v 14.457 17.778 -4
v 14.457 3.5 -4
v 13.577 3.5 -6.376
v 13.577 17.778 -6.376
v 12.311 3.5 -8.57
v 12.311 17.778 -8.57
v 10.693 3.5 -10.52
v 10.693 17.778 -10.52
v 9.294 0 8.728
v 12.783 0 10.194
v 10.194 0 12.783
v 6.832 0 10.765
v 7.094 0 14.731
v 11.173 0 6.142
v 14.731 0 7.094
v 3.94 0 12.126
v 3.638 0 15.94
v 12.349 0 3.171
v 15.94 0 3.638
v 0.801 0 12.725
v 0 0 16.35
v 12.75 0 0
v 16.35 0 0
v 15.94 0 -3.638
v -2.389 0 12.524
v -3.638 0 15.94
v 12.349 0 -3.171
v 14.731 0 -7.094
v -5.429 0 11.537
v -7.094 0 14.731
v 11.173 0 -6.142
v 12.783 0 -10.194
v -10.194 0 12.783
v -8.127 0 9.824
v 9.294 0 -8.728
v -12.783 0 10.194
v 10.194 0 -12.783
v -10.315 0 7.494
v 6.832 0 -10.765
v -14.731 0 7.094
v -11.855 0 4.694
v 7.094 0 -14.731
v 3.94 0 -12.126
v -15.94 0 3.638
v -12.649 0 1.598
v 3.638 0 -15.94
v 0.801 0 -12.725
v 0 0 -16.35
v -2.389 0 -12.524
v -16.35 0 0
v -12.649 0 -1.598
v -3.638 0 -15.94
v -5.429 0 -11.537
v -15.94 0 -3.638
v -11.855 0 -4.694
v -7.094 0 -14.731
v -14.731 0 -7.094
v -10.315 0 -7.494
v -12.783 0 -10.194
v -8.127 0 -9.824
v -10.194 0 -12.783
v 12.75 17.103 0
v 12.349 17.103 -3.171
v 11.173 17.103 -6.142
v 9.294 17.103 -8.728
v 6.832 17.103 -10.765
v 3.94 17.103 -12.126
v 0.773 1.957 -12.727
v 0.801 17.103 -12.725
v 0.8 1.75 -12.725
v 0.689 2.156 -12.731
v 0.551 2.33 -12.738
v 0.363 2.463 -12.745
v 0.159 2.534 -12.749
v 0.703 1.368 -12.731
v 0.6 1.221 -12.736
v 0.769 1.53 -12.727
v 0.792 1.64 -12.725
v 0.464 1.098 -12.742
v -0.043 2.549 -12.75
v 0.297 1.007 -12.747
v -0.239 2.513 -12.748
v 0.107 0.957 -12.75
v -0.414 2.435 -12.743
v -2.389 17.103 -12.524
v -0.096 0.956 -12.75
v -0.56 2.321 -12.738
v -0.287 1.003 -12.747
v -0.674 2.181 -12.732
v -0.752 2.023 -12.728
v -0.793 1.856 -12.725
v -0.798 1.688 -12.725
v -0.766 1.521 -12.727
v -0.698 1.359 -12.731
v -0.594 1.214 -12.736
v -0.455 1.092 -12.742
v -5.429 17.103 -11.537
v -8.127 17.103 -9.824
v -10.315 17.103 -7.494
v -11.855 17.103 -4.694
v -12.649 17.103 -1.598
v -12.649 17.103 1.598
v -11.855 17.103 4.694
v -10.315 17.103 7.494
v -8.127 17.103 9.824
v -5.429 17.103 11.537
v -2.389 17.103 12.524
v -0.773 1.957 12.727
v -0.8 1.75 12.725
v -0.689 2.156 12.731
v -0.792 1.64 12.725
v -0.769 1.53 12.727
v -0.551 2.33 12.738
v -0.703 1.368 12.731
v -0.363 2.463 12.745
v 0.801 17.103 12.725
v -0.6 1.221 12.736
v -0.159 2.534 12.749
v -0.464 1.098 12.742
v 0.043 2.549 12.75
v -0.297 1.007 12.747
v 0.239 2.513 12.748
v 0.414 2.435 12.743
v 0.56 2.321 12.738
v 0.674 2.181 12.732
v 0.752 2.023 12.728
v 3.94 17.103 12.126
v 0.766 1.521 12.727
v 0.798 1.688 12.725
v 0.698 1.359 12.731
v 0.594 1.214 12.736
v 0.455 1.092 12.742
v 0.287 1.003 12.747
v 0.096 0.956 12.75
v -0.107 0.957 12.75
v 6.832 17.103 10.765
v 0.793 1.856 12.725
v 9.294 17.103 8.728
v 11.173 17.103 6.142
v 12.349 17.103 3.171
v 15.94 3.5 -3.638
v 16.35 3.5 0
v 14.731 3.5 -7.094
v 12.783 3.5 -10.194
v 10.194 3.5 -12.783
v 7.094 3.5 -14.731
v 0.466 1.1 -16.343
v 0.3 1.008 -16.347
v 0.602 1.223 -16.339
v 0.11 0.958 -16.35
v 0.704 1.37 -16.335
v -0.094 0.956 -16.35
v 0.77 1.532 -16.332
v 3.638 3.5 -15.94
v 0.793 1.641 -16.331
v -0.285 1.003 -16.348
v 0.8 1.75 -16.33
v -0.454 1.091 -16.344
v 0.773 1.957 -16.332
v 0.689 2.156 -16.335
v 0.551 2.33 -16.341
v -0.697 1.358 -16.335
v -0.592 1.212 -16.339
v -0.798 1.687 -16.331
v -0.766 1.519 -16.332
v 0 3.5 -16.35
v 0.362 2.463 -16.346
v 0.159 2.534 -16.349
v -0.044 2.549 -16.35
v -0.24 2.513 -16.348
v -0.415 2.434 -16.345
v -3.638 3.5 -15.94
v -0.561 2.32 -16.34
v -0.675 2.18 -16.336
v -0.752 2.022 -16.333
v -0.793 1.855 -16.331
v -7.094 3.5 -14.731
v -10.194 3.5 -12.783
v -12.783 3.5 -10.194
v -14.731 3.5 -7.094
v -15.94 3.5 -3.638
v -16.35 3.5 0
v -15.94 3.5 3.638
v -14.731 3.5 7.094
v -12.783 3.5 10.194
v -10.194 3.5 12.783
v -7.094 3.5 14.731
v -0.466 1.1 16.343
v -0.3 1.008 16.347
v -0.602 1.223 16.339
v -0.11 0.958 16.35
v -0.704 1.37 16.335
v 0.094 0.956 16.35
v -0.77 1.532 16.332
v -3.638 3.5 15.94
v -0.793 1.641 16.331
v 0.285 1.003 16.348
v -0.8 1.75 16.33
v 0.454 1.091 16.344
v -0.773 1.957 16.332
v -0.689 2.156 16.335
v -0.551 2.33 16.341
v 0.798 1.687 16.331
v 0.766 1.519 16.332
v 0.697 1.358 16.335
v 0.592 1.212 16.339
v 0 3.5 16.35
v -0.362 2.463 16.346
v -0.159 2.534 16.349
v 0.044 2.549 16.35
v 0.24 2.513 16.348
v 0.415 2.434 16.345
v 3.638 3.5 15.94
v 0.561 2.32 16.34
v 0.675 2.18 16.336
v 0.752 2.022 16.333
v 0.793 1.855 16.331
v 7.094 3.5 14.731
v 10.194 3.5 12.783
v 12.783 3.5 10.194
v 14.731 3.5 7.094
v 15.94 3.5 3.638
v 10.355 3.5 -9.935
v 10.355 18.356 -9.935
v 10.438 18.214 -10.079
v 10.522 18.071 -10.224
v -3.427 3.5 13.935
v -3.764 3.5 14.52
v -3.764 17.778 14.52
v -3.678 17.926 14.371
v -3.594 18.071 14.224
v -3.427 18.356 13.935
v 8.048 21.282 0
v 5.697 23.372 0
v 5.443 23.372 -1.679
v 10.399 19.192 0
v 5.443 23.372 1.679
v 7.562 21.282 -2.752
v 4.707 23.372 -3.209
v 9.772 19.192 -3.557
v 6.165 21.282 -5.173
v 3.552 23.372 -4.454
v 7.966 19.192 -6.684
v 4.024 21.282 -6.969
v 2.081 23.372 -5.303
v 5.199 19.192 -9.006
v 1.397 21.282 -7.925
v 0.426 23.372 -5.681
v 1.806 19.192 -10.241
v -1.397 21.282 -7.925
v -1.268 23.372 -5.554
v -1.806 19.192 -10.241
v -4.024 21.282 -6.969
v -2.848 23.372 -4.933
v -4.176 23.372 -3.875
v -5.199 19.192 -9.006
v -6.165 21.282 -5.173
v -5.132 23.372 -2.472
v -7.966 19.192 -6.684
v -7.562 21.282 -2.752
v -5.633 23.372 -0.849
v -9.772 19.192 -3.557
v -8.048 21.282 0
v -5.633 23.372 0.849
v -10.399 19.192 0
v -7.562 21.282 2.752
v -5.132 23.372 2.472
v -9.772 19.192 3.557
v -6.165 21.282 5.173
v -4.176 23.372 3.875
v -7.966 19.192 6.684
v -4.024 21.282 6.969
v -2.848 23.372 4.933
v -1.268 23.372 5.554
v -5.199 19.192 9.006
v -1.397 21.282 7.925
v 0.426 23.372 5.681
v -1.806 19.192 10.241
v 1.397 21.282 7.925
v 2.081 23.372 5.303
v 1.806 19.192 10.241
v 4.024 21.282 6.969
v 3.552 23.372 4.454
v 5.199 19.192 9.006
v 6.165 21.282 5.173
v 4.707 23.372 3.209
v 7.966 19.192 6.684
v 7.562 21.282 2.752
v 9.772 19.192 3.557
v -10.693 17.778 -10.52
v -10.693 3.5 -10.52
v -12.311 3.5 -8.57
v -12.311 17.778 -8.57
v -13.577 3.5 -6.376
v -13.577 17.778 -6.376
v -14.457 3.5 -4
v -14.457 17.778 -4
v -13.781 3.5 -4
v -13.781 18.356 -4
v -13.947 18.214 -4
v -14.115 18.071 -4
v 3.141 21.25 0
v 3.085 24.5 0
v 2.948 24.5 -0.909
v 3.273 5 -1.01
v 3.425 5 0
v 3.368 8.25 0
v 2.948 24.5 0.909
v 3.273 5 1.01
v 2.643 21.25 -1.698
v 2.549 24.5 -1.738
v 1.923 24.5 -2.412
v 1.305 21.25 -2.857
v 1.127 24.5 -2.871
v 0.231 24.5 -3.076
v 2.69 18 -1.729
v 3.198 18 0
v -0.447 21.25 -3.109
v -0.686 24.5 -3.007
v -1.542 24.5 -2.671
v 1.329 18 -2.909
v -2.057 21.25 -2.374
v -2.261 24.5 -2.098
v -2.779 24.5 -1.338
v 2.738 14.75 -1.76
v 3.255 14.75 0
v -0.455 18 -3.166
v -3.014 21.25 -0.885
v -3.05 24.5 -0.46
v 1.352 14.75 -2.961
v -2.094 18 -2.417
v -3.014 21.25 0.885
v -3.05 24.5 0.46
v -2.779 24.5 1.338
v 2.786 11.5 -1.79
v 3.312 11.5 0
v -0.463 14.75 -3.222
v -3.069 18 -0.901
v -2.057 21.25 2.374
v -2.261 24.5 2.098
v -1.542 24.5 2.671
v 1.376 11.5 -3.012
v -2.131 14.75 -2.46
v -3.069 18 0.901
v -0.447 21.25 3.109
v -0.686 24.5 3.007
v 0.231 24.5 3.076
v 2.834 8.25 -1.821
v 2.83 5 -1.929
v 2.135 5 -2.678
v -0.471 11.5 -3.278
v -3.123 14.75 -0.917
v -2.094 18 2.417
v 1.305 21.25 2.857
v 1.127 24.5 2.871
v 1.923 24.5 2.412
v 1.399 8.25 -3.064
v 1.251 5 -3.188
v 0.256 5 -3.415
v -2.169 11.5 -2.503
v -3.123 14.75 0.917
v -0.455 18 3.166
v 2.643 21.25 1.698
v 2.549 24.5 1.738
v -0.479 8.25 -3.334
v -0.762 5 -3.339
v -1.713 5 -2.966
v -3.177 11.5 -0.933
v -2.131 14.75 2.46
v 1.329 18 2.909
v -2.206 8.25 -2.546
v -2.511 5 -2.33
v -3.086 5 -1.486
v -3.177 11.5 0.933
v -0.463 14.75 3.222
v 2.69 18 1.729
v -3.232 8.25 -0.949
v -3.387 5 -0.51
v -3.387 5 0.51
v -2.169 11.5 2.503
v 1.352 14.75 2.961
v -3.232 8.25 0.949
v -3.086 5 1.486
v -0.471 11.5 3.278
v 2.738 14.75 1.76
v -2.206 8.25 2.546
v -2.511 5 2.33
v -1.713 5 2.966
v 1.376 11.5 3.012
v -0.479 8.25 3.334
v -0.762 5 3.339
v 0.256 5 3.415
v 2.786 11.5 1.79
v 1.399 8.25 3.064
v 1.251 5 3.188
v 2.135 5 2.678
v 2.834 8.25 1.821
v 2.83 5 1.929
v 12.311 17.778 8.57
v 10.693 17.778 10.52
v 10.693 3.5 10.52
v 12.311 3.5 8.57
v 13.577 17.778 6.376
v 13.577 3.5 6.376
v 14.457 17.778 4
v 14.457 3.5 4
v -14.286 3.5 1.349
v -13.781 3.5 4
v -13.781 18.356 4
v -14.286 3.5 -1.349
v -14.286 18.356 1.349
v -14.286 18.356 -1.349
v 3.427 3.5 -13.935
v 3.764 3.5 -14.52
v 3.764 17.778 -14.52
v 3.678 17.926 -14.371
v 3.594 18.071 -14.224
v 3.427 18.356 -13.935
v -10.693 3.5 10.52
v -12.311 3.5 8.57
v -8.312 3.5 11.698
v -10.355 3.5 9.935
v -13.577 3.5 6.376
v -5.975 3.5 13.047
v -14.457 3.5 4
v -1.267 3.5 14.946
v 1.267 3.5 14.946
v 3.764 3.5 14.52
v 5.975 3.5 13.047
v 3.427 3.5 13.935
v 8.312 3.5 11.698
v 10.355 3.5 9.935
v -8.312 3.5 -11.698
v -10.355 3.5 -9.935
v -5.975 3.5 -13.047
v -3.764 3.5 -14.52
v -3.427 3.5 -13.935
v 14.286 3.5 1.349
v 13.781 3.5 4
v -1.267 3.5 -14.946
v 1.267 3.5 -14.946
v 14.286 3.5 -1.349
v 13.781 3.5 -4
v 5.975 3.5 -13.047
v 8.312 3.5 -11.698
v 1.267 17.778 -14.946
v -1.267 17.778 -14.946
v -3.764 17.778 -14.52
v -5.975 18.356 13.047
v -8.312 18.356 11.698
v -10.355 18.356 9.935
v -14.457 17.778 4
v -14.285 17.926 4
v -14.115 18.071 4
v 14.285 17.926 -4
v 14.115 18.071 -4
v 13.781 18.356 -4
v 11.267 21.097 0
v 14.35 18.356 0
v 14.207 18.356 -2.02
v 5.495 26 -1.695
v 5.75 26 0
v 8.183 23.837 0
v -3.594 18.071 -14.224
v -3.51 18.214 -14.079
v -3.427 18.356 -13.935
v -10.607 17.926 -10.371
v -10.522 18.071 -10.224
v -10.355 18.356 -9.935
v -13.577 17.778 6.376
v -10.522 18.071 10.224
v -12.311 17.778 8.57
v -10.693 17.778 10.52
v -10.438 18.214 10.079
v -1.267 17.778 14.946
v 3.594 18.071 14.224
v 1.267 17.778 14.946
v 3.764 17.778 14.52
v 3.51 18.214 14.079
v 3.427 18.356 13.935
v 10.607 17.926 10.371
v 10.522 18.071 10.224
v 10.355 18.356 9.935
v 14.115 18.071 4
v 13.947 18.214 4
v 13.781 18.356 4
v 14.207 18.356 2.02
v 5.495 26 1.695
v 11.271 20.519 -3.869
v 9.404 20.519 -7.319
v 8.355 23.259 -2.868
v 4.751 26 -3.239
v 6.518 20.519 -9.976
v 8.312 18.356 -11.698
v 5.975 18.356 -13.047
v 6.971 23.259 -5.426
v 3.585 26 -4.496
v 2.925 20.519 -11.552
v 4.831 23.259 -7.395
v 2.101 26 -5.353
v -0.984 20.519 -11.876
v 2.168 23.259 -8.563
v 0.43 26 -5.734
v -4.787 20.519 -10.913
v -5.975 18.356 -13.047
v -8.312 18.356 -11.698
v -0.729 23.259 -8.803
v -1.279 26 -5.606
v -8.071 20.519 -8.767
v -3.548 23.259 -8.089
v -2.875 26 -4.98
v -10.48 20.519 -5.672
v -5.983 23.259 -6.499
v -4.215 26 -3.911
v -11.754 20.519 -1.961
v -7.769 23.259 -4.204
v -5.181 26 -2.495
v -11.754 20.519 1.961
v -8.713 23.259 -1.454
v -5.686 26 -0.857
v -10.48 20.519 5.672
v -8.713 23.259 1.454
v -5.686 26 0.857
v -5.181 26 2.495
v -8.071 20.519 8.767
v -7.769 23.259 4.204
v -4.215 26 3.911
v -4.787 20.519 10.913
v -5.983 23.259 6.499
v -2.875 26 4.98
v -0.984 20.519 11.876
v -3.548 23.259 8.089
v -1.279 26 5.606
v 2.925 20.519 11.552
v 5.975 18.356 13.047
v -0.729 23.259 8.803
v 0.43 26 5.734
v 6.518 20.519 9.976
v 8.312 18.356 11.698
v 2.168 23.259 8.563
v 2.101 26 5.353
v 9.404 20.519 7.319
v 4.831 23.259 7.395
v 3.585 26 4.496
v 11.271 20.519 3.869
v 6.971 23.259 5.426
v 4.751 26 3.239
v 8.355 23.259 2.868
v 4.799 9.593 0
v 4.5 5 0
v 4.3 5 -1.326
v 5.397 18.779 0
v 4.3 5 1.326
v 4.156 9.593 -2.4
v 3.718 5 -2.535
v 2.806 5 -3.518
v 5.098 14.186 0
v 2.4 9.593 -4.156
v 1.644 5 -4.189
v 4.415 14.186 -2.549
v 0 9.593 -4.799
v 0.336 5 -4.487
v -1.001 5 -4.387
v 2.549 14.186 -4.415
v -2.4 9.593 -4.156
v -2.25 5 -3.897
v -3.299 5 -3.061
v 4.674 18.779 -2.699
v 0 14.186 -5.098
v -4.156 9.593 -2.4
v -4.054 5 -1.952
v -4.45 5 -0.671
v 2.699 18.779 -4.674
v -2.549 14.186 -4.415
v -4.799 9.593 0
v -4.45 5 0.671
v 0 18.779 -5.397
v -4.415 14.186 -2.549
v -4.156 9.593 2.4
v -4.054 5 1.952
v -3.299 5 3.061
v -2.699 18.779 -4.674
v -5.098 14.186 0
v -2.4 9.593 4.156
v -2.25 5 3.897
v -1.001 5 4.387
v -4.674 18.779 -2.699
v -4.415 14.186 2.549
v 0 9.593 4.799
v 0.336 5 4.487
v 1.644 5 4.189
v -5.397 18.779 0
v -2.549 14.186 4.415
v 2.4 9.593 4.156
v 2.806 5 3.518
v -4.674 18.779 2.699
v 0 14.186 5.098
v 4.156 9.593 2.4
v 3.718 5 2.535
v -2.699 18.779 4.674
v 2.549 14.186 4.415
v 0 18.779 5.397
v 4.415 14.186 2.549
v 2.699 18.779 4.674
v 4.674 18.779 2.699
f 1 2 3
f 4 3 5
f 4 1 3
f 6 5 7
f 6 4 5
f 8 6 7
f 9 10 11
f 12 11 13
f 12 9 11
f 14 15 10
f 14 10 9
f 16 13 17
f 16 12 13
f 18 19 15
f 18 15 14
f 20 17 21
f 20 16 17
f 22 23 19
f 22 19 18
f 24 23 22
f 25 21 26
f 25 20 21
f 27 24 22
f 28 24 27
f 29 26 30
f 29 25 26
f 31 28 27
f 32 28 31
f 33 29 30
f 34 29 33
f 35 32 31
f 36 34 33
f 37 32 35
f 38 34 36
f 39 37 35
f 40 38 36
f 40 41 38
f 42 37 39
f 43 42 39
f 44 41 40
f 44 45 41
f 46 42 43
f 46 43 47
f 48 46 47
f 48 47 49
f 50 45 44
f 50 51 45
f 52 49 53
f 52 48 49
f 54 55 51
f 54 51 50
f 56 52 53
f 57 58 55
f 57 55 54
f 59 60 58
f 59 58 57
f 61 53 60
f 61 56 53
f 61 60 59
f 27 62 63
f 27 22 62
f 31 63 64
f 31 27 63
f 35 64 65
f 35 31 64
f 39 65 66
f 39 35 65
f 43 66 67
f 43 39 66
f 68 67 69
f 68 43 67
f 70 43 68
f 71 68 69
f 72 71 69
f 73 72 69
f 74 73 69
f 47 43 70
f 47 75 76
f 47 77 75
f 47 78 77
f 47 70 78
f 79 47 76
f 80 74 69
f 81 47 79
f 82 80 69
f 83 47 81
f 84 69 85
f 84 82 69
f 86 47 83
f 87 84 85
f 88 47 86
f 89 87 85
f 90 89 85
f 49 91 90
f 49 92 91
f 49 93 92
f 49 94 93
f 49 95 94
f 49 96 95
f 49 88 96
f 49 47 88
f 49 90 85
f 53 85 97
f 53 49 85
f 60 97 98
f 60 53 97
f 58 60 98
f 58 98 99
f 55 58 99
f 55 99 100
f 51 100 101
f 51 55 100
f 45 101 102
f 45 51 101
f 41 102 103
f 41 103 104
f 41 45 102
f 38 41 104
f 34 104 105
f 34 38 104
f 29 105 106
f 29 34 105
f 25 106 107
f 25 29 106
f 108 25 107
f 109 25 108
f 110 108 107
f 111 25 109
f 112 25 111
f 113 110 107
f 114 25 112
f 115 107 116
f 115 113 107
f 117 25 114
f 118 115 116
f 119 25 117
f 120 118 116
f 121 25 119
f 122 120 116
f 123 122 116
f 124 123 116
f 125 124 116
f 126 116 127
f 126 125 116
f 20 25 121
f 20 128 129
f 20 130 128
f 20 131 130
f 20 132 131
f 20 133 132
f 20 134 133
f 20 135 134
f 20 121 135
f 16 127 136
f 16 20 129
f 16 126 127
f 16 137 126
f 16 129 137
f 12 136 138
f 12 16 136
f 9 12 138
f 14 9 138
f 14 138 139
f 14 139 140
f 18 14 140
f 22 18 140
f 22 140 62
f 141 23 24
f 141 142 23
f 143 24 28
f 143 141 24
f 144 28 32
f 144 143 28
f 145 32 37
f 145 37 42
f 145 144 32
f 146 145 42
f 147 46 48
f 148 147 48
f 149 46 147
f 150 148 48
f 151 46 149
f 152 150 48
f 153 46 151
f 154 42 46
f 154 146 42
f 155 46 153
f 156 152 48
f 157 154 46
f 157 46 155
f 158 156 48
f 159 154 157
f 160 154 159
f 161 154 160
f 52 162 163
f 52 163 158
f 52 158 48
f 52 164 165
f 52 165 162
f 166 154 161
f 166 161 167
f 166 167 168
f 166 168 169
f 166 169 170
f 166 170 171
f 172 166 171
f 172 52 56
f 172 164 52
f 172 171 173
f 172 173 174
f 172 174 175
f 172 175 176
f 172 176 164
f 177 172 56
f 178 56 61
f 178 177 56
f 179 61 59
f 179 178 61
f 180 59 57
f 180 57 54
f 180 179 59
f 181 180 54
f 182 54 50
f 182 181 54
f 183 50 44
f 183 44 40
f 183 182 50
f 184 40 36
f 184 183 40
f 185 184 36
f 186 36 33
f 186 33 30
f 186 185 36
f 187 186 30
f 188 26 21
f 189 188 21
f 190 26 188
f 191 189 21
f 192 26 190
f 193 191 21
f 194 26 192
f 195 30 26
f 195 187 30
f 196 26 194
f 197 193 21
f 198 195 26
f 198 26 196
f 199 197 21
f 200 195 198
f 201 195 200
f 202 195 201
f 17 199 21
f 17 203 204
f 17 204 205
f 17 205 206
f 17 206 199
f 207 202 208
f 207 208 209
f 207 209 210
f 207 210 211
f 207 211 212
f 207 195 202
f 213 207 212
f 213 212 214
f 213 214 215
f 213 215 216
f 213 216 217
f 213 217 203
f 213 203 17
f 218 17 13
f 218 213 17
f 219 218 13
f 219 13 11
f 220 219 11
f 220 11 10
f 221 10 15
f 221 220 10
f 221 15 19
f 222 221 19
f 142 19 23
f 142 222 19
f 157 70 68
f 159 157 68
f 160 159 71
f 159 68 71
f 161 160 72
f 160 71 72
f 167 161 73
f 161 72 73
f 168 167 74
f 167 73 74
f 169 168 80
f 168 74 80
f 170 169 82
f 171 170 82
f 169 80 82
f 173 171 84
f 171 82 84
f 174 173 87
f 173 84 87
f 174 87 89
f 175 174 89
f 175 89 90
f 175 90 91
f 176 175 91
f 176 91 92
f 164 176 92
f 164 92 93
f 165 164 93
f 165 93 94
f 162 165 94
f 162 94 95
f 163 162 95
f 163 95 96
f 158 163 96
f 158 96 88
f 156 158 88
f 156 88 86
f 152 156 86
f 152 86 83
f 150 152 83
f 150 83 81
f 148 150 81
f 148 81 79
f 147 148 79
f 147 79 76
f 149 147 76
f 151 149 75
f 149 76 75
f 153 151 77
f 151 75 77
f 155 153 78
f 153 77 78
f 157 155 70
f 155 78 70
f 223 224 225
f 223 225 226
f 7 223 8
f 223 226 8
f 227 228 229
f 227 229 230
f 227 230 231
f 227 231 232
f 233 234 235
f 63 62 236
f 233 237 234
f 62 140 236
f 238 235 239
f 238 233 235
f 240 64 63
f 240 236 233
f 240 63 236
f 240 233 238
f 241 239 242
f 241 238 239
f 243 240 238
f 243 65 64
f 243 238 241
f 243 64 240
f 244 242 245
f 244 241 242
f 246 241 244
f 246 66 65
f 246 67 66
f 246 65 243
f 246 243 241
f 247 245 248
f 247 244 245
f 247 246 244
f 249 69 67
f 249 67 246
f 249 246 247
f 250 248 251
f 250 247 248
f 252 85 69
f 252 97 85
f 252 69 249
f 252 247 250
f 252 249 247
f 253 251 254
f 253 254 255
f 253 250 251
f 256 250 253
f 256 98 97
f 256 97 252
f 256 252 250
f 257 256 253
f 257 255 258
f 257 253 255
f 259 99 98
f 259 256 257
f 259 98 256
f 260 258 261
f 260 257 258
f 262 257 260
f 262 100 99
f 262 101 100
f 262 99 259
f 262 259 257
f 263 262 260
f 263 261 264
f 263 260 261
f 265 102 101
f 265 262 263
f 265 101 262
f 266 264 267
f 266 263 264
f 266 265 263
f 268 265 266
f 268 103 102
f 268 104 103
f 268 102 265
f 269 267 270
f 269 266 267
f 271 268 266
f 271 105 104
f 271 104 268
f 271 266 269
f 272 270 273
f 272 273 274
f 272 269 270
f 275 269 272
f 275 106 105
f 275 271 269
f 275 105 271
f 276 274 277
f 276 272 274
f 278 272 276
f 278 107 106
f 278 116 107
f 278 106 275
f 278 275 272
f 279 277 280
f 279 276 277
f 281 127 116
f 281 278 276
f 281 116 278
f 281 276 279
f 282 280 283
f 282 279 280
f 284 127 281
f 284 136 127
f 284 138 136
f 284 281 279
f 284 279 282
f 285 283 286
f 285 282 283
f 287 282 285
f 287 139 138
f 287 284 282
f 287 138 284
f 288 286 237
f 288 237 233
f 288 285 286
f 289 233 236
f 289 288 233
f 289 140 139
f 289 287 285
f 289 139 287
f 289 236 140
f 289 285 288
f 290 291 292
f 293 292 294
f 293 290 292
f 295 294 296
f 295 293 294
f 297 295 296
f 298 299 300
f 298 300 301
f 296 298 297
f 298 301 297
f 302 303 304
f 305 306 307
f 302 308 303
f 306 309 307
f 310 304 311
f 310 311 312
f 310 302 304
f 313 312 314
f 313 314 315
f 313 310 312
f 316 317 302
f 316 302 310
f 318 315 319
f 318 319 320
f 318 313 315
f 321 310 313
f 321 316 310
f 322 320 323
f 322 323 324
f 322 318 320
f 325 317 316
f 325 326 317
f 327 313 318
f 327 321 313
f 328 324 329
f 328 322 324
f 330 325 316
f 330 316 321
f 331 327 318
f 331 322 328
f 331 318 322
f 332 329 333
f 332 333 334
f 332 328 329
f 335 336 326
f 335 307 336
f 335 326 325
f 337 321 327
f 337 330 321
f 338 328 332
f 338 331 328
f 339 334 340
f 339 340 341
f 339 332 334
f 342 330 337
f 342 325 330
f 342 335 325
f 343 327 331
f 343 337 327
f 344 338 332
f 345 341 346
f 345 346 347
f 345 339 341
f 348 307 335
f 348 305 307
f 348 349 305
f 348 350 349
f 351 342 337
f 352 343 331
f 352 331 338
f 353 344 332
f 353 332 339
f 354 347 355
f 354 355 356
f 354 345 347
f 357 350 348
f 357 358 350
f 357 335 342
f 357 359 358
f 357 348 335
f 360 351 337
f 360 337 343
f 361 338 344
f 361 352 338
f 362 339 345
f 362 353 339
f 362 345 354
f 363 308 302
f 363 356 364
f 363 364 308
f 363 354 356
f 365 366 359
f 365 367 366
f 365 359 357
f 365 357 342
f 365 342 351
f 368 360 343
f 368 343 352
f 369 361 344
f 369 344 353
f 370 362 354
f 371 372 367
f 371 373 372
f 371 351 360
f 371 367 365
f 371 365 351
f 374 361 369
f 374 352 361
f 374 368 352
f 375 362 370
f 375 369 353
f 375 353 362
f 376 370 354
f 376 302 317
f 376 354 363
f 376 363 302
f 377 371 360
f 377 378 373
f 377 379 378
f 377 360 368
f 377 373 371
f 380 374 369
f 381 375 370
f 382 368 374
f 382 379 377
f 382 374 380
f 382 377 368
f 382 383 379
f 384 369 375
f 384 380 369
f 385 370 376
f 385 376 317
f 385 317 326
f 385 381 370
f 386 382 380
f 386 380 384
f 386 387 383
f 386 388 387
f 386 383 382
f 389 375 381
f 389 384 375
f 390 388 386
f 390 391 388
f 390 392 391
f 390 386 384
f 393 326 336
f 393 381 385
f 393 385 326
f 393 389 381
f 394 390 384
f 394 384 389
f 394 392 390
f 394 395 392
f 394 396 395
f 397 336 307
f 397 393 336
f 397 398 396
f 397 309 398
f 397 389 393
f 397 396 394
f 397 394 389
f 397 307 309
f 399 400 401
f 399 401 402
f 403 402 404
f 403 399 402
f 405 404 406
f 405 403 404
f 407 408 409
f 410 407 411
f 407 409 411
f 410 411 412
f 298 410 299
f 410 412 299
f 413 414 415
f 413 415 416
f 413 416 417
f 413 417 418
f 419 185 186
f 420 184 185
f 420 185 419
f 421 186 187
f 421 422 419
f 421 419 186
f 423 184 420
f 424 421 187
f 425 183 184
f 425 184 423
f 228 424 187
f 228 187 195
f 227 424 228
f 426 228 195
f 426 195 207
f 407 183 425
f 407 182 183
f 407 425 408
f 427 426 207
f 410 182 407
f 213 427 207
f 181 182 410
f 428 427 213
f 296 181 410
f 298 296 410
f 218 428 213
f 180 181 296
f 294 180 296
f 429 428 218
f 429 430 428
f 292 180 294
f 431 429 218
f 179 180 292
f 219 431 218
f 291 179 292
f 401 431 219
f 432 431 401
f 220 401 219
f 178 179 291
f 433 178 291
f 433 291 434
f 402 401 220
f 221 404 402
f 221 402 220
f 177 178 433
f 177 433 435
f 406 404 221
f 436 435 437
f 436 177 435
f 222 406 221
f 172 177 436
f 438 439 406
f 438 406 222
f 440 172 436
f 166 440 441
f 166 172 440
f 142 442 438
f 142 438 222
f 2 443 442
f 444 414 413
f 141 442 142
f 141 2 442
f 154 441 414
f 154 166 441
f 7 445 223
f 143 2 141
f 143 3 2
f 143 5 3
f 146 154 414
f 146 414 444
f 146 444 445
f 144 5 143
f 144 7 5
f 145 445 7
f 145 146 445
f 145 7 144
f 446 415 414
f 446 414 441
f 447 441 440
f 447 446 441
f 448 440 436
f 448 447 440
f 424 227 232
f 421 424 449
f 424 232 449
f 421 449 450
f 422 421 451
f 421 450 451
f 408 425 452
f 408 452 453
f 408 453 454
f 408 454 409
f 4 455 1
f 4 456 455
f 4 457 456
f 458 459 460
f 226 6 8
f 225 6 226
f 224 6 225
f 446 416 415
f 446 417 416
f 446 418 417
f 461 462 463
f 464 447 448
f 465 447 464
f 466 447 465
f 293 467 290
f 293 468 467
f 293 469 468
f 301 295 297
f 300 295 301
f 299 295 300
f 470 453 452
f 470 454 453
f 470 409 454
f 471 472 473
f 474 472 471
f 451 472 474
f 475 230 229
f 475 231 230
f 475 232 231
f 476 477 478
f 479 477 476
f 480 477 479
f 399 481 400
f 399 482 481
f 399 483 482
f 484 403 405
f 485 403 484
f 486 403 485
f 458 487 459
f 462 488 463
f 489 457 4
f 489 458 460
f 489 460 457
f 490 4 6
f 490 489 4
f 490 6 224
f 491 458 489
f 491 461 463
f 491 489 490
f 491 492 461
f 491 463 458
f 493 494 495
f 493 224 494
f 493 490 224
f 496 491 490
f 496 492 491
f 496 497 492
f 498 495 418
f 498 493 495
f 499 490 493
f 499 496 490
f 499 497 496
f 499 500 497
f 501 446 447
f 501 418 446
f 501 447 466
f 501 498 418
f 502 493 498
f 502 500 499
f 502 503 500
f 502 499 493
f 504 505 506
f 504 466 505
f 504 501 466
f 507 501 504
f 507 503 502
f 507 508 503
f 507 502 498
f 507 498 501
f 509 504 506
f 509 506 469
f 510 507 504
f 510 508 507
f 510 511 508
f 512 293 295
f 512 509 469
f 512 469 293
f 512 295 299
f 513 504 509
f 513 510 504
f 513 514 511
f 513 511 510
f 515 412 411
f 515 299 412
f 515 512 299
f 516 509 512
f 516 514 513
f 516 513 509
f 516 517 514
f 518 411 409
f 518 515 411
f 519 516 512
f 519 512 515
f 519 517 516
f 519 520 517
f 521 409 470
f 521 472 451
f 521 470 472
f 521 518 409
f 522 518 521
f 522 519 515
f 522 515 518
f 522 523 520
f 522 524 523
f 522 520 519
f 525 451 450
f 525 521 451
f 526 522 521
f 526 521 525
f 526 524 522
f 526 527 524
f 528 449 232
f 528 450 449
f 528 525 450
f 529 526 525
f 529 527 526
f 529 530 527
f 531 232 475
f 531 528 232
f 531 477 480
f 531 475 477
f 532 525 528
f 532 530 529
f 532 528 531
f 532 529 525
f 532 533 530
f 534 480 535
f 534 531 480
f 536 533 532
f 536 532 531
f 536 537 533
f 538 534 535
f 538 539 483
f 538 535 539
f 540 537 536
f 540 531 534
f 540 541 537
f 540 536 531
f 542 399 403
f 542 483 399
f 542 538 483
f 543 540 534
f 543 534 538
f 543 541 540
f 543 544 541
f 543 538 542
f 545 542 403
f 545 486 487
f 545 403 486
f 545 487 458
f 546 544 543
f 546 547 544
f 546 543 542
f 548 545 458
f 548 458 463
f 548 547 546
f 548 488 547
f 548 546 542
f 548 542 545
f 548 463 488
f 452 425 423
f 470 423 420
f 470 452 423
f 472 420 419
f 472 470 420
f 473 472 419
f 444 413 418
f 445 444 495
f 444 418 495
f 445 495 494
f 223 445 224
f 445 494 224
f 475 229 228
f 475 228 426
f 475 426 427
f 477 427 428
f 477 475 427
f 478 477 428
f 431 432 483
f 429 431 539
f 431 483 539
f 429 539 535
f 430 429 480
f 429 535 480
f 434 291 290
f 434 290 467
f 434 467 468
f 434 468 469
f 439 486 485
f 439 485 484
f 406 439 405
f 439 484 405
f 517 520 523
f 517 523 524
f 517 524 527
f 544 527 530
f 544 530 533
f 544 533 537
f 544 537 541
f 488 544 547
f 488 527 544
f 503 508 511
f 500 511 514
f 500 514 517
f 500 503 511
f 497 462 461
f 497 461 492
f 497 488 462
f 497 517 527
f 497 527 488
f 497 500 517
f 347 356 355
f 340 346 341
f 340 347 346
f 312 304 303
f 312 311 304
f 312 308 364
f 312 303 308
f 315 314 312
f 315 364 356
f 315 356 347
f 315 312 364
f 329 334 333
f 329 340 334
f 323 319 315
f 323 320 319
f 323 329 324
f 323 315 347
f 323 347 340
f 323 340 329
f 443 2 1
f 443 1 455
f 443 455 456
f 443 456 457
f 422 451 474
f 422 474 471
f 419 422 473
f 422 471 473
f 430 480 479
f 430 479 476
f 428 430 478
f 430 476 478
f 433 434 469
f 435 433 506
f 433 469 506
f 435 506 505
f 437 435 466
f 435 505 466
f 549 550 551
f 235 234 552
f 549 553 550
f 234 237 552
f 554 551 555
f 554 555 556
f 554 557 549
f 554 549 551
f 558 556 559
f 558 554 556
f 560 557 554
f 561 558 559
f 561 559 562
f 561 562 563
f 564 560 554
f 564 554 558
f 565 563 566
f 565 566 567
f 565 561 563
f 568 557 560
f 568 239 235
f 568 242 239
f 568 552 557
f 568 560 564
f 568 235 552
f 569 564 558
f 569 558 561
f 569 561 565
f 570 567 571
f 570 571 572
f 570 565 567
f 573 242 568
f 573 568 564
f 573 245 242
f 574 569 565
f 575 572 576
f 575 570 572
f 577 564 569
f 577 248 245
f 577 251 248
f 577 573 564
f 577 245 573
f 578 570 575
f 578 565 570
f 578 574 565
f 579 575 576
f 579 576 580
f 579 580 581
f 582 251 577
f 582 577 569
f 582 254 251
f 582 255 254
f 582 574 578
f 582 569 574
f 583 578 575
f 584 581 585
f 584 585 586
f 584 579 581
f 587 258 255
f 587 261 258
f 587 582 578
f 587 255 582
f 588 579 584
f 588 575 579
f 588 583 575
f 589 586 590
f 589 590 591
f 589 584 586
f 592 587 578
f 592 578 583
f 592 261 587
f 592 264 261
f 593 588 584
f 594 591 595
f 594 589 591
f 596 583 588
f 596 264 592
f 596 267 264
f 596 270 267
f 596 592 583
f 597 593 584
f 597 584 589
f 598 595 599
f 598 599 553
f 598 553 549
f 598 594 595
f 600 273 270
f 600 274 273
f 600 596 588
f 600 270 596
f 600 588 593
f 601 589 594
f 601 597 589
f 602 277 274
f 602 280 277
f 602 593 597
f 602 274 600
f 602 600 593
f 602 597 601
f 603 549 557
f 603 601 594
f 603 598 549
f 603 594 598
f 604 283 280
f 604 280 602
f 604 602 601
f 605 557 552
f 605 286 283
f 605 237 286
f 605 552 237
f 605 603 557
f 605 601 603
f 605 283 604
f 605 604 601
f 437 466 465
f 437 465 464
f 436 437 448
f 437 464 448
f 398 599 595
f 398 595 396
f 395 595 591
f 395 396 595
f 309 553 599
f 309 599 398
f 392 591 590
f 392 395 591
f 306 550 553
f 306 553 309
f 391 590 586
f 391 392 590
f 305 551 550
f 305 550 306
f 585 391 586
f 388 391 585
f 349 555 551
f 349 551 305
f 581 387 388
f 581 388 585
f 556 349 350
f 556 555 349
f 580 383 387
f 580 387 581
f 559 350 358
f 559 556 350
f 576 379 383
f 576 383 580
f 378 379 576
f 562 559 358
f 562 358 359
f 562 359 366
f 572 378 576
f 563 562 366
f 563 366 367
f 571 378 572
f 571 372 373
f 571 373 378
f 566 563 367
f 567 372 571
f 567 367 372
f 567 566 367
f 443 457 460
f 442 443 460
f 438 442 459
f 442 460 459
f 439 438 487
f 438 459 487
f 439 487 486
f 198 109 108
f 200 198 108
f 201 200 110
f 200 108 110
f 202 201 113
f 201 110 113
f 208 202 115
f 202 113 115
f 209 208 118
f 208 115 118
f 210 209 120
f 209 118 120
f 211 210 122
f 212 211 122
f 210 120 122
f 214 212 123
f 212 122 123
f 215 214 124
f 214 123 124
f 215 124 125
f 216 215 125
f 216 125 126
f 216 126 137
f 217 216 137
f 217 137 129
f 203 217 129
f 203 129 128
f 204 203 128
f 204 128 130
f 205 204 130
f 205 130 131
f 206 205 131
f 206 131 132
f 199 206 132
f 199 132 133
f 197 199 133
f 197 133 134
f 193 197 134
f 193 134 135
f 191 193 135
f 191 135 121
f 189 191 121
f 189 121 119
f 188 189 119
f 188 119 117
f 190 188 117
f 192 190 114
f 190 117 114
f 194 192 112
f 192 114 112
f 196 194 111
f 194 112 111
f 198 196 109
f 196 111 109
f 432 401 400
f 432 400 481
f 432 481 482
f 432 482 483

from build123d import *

# Parameters (mm, degrees)
CUT_EXTRUDE1_DEPTH        = 22.5
CIRPATTERN1_COUNT         = 6
M2X0_4_TAPPED_HOLE1_D     = 1.6
M2X0_4_TAPPED_HOLE1_DEPTH = 7
M2X0_4_TAPPED_HOLE1_TIP   = 0.480688495
M2X0_4_TAPPED_HOLE2_D     = 1.6
M2X0_4_TAPPED_HOLE2_DEPTH = 8.2
M2X0_4_TAPPED_HOLE2_TIP   = 0.480688495


with BuildPart() as part:
    # Sketch1 one side → Revolve3 (revolve)
    with BuildSketch(Plane.XY):
        Polygon((12.75, 0), (16.35, 0), (16.35, 3.5), (15, 3.5), (15, 17.778485378), (5.75, 26), (0, 26), (0, 24.5), (3.084626234, 24.5), (3.425, 5), (4.5, 5), (5.696502575, 23.37174091), (12.75, 17.102504994), align=None)
    revolve(axis=Axis((0, 0, 0), (0, 1, 0)))

    # Sketch2 → Cut-Extrude1 (cut)
    with BuildSketch(Plane(origin=(0, 26, 0), x_dir=(1, 0, 0), z_dir=(0, 1, 0))):
        with BuildLine():
            Line((13.781237245, -4), (14.456832295, -4))
            ThreePointArc((14.456832295, -4), (15, 0), (14.456832295, 4))
            Line((14.456832295, 4), (13.781237245, 4))
            ThreePointArc((13.781237245, 4), (14.35, 0), (13.781237245, -4))
        make_face()
    cut_extrude1 = extrude(amount=-CUT_EXTRUDE1_DEPTH, mode=Mode.SUBTRACT)

    # CirPattern1: Cut-Extrude1 ×6 about axis
    cirpattern1_axis = Axis((0, 0, 0), (0, 1, 0))
    for i in range(1, CIRPATTERN1_COUNT):
        add(cut_extrude1.rotate(cirpattern1_axis, i * 360 / CIRPATTERN1_COUNT), mode=Mode.SUBTRACT)

    # M2x0.4 Tapped Hole1
    with Locations(Plane.XY.offset(16.35)):
        with Locations((0, 1.75)):
            Hole(M2X0_4_TAPPED_HOLE1_D / 2, depth=M2X0_4_TAPPED_HOLE1_DEPTH)
            with Locations((0, 0, -(M2X0_4_TAPPED_HOLE1_DEPTH + M2X0_4_TAPPED_HOLE1_TIP / 2))):  # 118° drill point
                Cone(0, M2X0_4_TAPPED_HOLE1_D / 2, M2X0_4_TAPPED_HOLE1_TIP, mode=Mode.SUBTRACT)

    # M2x0.4 Tapped Hole2
    with Locations(Plane(origin=(0, 0, -16.35), x_dir=(-1, 0, 0), z_dir=(0, 0, -1))):
        with Locations((0, 1.75)):
            Hole(M2X0_4_TAPPED_HOLE2_D / 2, depth=M2X0_4_TAPPED_HOLE2_DEPTH)
            with Locations((0, 0, -(M2X0_4_TAPPED_HOLE2_DEPTH + M2X0_4_TAPPED_HOLE2_TIP / 2))):  # 118° drill point
                Cone(0, M2X0_4_TAPPED_HOLE2_D / 2, M2X0_4_TAPPED_HOLE2_TIP, mode=Mode.SUBTRACT)


solid = part.part
